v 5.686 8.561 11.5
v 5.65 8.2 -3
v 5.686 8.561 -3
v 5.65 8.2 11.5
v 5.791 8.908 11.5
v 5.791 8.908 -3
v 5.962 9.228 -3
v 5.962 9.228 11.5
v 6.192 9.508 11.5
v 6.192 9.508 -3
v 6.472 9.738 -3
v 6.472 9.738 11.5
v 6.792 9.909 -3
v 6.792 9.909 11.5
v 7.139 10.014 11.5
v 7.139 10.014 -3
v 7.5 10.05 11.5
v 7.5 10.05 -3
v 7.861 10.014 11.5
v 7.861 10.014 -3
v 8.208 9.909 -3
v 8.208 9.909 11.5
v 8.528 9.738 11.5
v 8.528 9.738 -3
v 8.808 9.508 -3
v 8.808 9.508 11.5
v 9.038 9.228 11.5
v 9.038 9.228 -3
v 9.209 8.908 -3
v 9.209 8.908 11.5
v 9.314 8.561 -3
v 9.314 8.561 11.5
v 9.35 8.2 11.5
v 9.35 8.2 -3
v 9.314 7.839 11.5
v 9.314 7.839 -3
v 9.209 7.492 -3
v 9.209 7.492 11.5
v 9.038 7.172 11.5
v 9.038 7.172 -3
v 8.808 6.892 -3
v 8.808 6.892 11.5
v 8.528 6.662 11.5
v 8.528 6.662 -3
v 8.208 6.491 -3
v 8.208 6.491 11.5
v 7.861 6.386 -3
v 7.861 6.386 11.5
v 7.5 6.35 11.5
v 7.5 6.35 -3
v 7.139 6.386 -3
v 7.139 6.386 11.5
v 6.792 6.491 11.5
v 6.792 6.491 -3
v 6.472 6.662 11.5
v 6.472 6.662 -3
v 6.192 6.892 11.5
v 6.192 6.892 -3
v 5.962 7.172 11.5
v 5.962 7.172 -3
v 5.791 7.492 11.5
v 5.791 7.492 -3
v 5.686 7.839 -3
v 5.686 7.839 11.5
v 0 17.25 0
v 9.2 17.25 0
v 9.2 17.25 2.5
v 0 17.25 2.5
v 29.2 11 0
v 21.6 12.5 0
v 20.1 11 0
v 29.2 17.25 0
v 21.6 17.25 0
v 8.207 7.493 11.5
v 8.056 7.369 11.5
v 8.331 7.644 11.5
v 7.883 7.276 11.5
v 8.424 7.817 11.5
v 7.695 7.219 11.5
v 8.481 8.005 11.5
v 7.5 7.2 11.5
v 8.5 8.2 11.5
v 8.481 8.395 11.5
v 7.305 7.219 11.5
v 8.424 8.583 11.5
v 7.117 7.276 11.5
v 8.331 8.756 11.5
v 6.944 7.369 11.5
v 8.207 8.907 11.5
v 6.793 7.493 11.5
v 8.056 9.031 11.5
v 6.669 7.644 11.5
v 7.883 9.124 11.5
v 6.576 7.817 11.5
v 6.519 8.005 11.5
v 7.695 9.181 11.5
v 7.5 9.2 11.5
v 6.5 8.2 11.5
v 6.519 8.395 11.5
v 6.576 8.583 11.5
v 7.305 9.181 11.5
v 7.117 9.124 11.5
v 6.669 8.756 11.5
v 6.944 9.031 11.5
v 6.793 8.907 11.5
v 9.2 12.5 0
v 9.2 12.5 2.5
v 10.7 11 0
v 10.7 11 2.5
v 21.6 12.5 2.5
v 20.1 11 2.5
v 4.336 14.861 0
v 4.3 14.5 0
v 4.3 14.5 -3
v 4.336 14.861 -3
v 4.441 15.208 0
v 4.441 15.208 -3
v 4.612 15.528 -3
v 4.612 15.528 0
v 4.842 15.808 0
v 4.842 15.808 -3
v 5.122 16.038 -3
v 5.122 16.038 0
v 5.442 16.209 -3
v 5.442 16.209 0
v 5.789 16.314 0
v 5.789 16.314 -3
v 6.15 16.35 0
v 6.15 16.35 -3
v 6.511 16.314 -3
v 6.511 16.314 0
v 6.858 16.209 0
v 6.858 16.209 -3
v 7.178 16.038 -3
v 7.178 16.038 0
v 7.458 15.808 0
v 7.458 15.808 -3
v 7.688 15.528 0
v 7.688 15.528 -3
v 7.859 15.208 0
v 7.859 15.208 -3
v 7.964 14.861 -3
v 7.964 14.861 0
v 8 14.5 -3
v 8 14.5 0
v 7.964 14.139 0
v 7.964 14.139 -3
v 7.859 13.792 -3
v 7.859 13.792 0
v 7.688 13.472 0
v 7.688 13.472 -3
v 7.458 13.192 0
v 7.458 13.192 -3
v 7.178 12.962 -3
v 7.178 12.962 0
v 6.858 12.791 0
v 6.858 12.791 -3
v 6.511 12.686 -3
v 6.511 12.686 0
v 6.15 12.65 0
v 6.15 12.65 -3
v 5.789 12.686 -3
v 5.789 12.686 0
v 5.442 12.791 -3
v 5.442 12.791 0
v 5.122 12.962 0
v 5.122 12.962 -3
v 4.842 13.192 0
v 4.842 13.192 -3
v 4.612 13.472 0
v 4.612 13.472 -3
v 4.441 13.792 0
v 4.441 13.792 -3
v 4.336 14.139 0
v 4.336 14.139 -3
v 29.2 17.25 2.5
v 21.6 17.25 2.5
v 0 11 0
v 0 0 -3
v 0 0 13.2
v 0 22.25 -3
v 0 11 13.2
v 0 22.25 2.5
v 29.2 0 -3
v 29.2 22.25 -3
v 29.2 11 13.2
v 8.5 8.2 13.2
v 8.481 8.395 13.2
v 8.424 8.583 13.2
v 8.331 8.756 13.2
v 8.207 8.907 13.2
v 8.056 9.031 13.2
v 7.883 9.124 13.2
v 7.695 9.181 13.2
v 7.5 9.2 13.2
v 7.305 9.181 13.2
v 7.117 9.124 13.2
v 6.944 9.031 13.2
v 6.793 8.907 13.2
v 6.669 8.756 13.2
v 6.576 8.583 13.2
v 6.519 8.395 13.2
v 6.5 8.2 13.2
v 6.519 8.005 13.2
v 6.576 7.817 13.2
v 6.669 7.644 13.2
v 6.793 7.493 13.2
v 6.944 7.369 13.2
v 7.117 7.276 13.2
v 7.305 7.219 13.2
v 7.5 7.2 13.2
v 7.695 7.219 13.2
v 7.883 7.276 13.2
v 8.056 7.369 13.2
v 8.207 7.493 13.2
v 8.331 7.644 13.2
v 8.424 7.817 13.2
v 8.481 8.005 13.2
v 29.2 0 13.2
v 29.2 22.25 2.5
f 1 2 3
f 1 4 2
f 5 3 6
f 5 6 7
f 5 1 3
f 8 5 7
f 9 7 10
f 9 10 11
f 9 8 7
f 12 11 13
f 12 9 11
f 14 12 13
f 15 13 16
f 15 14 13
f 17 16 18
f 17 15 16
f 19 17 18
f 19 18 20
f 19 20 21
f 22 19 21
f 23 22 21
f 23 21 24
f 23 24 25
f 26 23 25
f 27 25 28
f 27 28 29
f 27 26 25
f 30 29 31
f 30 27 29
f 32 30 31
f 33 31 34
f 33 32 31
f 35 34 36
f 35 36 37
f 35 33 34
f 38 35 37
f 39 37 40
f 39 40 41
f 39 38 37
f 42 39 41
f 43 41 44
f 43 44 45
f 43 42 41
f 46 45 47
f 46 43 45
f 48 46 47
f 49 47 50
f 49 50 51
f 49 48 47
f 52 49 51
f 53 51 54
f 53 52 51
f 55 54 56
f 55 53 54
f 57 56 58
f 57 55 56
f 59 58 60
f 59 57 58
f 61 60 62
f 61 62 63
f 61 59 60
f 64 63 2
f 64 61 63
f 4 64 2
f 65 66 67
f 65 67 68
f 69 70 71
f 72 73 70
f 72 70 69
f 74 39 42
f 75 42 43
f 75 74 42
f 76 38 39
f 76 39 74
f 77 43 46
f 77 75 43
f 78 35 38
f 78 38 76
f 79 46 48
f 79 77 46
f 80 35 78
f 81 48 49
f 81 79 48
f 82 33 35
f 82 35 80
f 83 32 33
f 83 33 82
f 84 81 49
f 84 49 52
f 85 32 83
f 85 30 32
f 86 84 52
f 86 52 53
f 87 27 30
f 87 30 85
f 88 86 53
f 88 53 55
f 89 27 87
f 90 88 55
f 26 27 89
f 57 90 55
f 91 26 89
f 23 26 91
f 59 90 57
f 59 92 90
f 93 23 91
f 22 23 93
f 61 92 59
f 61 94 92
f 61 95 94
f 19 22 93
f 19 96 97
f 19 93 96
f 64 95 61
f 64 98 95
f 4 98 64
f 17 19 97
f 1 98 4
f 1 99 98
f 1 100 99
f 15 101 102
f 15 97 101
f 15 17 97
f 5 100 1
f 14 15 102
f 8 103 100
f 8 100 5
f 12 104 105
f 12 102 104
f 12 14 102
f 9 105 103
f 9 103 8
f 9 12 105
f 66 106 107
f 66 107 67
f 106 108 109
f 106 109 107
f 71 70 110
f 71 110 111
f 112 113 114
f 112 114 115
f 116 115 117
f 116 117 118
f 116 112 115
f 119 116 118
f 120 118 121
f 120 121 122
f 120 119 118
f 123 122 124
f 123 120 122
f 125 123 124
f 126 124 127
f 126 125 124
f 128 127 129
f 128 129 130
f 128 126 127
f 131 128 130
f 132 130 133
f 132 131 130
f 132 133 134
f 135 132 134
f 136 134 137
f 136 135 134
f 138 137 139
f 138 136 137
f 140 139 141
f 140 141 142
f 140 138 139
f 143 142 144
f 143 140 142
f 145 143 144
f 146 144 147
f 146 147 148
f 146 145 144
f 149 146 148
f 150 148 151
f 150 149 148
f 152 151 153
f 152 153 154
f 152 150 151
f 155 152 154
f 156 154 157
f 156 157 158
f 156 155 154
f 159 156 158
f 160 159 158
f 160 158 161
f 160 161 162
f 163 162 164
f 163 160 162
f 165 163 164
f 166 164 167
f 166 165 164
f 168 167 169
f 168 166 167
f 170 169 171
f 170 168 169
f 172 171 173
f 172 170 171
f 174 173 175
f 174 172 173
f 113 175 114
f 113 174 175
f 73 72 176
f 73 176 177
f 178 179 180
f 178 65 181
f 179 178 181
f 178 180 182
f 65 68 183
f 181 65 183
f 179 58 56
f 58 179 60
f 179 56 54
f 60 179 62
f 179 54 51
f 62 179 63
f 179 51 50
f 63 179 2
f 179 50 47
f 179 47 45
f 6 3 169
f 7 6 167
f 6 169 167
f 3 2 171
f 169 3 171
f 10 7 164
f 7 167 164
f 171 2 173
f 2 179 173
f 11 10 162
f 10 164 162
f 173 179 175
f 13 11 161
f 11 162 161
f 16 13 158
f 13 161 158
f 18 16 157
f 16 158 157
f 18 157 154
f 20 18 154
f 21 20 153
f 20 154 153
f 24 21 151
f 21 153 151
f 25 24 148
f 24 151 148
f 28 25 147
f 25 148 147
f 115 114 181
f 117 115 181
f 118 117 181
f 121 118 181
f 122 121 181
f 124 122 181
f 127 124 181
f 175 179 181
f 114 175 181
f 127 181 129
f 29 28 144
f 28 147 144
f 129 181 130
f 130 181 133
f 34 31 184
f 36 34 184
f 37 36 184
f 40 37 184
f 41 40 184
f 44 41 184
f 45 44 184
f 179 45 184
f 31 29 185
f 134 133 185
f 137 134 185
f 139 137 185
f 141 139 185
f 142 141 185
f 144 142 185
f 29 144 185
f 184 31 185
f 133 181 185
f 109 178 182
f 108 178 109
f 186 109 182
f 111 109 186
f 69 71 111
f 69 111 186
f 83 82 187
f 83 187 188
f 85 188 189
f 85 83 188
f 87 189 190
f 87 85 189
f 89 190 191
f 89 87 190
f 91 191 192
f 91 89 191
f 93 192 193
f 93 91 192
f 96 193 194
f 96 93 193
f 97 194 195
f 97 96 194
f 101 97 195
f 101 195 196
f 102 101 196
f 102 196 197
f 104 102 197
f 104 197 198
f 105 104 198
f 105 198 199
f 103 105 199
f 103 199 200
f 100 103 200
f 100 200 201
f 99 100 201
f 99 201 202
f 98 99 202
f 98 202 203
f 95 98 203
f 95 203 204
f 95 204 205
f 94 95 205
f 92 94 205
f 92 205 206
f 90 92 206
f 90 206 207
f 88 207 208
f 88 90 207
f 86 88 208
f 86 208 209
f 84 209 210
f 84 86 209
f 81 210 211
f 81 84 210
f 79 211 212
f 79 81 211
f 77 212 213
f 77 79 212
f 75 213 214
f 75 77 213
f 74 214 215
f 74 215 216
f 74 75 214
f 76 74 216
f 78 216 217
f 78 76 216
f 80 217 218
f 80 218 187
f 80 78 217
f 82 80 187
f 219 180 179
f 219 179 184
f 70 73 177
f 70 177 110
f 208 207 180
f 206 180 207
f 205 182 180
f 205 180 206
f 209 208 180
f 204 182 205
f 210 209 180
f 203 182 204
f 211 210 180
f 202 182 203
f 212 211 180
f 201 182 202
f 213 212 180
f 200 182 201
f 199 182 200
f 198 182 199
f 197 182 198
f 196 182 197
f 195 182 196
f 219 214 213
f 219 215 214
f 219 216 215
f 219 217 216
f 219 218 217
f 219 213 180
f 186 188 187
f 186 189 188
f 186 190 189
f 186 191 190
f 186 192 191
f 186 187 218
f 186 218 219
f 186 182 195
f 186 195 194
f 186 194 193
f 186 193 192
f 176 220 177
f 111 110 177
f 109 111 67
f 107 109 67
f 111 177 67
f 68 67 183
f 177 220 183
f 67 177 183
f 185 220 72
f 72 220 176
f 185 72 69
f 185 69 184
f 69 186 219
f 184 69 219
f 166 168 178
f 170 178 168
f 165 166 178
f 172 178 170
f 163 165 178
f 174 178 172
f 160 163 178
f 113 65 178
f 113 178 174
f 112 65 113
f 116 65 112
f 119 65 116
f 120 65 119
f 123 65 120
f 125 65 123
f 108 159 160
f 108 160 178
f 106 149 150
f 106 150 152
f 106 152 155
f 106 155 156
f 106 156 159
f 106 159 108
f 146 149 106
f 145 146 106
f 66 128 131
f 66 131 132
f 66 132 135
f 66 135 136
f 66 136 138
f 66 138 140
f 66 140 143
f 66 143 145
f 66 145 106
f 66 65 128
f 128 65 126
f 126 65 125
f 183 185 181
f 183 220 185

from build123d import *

# Parameters (mm, degrees)
SKETCH1_W           = 29.2
SKETCH1_H           = 11
SKETCH1_R           = 1
BOSS_EXTRUDE1_DEPTH = 13.2
SKETCH6_R           = 1.85
CUT_EXTRUDE3_DEPTH  = 11.5
BOSS_EXTRUDE4_DEPTH = 2.5
SKETCH8_R           = 1.85
BOSS_EXTRUDE5_DEPTH = 3


with BuildPart() as part:
    # Sketch1 → Boss-Extrude1 (new body)
    with BuildSketch(Plane.XY):
        with Locations((14.6, 5.5)):
            Rectangle(SKETCH1_W, SKETCH1_H)
        with Locations((7.5, 8.2)):
            Circle(SKETCH1_R, mode=Mode.SUBTRACT)
    extrude(amount=BOSS_EXTRUDE1_DEPTH)

    # Sketch6 → Cut-Extrude3 (cut)
    with BuildSketch(Plane(origin=(0, 0, 0), x_dir=(-1, 0, 0), z_dir=(0, 0, -1))):
        with Locations((-7.5, 8.2)):
            Circle(SKETCH6_R)
    extrude(amount=-CUT_EXTRUDE3_DEPTH, mode=Mode.SUBTRACT)

    # Sketch7 → Boss-Extrude4 (add)
    with BuildSketch(Plane(origin=(0, 0, 0), x_dir=(-1, 0, 0), z_dir=(0, 0, -1))):
        Polygon((-20.1, 11), (-10.7, 11), (-9.2, 12.5), (-9.2, 17.25), (0, 17.25), (0, 22.25), (-29.2, 22.25), (-29.2, 17.25), (-21.6, 17.25), (-21.6, 12.5), align=None)
    extrude(amount=-BOSS_EXTRUDE4_DEPTH)

    # Sketch8 → Boss-Extrude5 (add)
    with BuildSketch(Plane(origin=(0, 0, 0), x_dir=(-1, 0, 0), z_dir=(0, 0, -1))):
        Polygon((-29.2, 22.25), (0, 22.25), (0, 16), (0, 10.75), (0, 0), (-29.2, 0), (-29.2, 10.75), (-29.2, 16), align=None)
        with Locations((-7.5, 8.2)):
            Circle(SKETCH8_R, mode=Mode.SUBTRACT)
        with Locations((-6.15, 14.5)):
            Circle(SKETCH8_R, mode=Mode.SUBTRACT)
    extrude(amount=BOSS_EXTRUDE5_DEPTH)


solid = part.part
